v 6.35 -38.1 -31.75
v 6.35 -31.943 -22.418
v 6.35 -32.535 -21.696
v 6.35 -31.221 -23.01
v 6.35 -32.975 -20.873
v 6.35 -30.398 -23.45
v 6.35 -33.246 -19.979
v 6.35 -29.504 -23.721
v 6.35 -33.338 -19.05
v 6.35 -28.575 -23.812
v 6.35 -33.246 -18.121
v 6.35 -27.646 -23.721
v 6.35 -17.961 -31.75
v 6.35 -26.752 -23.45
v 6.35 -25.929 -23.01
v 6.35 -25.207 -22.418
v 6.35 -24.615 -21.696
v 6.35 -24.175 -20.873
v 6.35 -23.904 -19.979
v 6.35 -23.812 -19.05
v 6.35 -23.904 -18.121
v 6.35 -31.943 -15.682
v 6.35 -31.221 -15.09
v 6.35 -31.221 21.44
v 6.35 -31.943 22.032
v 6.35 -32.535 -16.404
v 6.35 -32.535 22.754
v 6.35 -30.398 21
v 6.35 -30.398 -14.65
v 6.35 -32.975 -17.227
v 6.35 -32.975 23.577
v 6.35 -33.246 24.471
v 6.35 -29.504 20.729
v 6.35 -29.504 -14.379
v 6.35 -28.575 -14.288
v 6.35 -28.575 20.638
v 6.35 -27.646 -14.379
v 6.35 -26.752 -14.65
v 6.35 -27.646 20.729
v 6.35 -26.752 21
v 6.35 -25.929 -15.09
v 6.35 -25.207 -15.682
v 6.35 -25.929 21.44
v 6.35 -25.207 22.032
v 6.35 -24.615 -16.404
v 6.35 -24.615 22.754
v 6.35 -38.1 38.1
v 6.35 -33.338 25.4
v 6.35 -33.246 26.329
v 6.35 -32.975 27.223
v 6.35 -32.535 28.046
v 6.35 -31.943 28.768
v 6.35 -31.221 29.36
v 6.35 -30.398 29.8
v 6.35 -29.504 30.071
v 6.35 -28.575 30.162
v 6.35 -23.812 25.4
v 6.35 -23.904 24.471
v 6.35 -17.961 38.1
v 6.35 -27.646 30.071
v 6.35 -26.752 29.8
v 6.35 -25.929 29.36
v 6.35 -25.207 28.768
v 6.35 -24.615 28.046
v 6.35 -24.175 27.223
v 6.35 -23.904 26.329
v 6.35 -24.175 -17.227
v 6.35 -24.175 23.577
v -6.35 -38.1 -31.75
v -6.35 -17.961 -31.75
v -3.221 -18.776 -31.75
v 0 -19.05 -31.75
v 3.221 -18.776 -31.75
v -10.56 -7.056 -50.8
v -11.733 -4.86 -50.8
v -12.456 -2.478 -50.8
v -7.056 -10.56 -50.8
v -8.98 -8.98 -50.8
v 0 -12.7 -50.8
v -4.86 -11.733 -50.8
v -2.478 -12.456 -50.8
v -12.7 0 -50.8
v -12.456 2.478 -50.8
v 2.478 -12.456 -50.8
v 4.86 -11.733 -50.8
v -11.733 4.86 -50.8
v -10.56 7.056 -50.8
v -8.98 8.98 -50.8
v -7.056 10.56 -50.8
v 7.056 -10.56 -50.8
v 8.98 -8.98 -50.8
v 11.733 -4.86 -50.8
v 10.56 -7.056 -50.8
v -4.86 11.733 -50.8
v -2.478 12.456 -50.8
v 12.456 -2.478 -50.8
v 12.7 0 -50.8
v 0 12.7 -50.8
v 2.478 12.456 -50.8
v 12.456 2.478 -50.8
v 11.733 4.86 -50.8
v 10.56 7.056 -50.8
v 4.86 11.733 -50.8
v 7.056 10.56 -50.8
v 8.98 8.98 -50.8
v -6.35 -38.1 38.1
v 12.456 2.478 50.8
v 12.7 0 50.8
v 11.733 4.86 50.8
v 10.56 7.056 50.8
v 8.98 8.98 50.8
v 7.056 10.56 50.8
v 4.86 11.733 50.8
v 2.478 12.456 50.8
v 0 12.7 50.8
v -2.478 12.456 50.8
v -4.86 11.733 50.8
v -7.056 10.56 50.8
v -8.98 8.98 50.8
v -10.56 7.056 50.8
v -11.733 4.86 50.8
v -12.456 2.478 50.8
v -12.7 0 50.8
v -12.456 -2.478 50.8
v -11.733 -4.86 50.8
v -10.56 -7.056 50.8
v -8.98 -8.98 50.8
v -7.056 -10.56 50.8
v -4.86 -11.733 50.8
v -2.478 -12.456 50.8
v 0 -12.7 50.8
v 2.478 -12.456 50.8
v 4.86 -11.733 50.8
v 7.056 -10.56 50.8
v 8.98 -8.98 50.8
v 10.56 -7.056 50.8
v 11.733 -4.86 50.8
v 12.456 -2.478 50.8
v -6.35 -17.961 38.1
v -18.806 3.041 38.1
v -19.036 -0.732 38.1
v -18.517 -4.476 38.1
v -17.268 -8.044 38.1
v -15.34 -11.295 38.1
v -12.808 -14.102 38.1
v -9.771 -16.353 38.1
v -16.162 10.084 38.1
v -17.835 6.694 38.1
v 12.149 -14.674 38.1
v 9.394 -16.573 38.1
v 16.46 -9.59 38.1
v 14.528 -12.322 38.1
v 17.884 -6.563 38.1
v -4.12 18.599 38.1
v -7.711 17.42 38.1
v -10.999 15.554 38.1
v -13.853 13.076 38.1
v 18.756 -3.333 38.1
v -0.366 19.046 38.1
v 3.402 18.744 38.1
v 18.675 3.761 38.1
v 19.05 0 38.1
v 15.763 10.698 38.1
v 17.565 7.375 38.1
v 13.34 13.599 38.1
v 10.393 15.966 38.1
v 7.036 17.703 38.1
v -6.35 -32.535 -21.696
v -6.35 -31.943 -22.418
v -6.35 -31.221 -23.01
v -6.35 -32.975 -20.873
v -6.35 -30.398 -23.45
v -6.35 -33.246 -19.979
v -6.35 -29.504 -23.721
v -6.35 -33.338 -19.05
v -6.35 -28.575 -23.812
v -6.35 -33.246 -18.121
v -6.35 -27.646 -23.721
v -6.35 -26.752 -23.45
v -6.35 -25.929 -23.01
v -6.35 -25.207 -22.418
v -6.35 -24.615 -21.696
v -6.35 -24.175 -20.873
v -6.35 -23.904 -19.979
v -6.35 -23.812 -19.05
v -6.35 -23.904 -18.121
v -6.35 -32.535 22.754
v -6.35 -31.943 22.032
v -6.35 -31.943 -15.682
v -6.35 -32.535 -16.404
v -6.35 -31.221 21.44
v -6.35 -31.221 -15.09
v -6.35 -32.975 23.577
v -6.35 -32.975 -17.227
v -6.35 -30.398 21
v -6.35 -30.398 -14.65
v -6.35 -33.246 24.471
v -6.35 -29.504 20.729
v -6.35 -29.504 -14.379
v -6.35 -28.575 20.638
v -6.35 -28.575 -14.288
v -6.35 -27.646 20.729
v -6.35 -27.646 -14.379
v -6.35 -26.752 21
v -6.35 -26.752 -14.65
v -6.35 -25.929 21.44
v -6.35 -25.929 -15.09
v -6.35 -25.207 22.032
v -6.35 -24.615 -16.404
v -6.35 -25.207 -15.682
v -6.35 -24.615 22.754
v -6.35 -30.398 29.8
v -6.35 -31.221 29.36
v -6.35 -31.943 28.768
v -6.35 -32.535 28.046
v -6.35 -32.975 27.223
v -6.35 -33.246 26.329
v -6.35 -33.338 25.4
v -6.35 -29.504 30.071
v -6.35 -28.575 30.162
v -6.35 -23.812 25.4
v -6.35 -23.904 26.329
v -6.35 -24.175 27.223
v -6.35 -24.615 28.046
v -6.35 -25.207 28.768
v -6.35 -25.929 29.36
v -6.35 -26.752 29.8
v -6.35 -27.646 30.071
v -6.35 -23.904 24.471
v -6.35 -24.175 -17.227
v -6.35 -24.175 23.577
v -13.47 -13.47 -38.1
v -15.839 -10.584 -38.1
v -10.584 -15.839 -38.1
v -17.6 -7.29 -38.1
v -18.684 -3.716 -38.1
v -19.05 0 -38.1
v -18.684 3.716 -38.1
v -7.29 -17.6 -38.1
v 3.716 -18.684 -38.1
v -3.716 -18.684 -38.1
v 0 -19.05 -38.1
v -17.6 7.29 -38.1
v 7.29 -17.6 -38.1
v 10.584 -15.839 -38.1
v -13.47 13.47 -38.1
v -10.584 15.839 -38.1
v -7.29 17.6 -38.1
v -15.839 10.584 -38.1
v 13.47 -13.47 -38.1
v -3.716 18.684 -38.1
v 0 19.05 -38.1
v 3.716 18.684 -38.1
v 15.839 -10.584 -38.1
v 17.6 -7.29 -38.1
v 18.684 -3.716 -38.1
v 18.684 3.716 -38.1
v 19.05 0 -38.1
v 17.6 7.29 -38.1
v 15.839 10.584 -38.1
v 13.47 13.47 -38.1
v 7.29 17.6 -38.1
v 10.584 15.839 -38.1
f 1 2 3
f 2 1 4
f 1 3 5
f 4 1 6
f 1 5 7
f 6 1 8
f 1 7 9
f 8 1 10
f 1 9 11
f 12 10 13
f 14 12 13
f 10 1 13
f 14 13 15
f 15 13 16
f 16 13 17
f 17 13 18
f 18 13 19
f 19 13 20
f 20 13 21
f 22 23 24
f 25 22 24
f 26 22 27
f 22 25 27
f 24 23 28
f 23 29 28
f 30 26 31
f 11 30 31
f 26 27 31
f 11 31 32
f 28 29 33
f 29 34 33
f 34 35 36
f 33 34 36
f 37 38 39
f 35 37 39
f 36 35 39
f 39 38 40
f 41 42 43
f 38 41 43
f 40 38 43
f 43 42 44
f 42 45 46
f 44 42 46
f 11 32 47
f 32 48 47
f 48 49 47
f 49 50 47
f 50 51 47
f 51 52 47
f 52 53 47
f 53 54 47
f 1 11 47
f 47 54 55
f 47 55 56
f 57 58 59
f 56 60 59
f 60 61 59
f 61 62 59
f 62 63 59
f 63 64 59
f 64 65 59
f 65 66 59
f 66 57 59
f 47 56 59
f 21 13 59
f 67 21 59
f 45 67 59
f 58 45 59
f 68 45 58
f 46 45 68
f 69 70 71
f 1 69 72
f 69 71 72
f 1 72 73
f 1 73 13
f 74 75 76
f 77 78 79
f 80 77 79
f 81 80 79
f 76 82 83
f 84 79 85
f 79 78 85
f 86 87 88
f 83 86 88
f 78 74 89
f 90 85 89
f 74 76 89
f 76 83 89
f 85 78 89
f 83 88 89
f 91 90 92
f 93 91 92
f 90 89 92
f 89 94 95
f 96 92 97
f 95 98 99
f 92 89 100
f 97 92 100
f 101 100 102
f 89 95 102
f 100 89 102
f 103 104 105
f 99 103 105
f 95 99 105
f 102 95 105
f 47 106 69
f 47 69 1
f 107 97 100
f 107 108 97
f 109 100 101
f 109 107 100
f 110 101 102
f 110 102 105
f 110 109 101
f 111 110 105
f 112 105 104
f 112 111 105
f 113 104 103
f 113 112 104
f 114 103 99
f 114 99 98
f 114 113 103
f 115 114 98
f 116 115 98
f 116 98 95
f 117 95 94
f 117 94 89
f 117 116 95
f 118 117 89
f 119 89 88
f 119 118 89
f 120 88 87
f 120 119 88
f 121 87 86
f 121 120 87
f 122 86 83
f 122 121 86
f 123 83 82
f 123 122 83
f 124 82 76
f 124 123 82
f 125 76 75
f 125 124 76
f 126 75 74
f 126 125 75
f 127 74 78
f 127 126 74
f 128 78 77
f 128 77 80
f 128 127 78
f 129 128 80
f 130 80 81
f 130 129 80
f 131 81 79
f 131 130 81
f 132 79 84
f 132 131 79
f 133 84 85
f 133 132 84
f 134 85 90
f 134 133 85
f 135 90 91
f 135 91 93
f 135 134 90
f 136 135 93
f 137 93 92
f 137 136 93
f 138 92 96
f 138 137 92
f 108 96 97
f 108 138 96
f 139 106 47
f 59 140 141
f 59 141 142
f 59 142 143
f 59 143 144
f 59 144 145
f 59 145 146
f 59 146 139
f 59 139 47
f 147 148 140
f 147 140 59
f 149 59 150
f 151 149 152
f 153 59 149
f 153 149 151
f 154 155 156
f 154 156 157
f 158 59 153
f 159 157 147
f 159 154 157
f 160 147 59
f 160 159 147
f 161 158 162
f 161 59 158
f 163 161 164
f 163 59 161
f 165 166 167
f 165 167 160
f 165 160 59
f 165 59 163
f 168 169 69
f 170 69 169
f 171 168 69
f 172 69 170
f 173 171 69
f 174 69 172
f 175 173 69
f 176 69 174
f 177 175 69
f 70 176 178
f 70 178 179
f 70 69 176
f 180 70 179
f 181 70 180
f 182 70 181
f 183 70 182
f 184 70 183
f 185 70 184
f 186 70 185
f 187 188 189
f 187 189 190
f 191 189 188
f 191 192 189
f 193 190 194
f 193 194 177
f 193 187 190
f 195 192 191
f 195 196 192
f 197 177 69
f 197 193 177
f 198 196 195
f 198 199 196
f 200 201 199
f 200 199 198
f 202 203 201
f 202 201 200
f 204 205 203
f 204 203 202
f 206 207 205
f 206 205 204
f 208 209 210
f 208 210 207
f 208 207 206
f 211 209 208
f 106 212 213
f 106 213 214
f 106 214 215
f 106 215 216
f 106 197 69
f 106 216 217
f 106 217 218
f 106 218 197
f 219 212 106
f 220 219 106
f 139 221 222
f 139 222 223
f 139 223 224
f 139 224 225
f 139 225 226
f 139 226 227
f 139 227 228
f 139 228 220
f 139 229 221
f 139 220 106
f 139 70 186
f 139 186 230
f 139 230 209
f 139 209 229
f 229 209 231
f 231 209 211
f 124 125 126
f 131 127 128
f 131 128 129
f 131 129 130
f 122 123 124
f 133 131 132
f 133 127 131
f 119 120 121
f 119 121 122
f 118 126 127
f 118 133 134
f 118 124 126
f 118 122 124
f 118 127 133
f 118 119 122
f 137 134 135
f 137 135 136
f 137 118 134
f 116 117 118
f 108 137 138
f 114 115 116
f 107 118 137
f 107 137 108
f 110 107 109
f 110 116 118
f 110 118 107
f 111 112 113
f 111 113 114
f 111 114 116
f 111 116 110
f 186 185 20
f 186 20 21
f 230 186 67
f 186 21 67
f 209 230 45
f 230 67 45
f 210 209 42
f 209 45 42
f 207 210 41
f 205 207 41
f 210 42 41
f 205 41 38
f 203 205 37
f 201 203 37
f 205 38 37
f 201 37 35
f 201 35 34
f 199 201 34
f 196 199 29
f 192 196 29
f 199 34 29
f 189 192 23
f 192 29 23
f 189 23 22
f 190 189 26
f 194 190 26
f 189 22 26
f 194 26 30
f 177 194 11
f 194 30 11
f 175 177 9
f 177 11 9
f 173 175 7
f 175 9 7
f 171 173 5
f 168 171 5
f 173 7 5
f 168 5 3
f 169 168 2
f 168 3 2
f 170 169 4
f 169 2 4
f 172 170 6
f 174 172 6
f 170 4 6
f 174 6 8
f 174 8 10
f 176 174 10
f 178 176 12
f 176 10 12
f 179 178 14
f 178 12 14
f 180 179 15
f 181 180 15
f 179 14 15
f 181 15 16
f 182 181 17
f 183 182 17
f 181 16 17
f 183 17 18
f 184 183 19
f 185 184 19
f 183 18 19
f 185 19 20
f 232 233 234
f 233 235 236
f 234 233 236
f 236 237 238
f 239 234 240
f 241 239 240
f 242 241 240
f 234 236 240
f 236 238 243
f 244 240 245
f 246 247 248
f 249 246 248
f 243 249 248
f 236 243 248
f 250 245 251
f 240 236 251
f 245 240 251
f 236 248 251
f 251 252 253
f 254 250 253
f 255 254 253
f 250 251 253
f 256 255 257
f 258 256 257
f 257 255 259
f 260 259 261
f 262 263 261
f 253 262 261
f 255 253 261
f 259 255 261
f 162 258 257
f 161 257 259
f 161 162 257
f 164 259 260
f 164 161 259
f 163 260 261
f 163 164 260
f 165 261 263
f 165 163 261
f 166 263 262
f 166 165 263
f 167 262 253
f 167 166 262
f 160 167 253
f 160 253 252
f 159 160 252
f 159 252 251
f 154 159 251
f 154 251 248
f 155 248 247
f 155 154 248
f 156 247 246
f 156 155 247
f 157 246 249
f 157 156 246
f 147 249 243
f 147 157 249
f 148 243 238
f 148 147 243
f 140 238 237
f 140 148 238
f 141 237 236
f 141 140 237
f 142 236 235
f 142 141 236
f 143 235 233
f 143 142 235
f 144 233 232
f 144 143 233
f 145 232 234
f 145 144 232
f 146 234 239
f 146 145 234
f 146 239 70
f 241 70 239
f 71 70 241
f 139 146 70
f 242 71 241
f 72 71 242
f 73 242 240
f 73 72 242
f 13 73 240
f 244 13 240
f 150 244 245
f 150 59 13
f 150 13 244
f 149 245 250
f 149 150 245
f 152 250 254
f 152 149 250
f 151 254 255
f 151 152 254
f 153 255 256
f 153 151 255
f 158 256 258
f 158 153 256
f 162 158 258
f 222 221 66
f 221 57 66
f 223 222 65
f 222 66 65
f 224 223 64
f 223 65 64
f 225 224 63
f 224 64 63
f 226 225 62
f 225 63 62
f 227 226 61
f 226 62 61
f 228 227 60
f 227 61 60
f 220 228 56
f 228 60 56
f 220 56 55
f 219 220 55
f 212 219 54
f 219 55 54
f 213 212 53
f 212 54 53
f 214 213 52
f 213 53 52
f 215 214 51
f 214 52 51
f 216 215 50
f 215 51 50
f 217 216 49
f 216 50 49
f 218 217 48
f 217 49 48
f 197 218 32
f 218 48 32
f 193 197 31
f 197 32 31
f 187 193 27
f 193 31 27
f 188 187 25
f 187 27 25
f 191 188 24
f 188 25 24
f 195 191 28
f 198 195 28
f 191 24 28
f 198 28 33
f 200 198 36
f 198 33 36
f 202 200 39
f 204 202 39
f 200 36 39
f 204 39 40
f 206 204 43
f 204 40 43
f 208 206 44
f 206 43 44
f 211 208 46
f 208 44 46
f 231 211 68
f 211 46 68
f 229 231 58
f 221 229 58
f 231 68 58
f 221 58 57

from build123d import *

# Parameters (mm, degrees)
F0_R     = 19.05
F1_DEPTH = 38.1
F2_W     = 12.7
F2_H     = 69.85
F3_DEPTH = 38.1
F4_R     = 4.7625
F5_DEPTH = 12.7
F6_R     = 12.7
F7_DEPTH = 50.8


with BuildPart() as f1:
    # F0 (on Top) → F1 (new body, symmetric)
    with BuildSketch(Plane.XY):
        Circle(F0_R)
    extrude(amount=F1_DEPTH, both=True)

    # F2 (on Front) → F3 (join)
    with BuildSketch(Plane.XZ):
        with Locations((0, 3.175)):
            Rectangle(F2_W, F2_H)
    extrude(amount=F3_DEPTH)

    # F4 (on Right) → F5 (cut, symmetric)
    with BuildSketch(Plane.YZ):
        with Locations((-28.575, 25.4)):
            Circle(F4_R)
        with Locations((-28.575, -19.05)):
            Circle(F4_R)
    extrude(amount=F5_DEPTH, both=True, mode=Mode.SUBTRACT)


with BuildPart() as f7:
    # F6 (on Top) → F7 (new body, symmetric)
    with BuildSketch(Plane.XY):
        Circle(F6_R)
    extrude(amount=F7_DEPTH, both=True)


solid = Compound([f1.part, f7.part])
